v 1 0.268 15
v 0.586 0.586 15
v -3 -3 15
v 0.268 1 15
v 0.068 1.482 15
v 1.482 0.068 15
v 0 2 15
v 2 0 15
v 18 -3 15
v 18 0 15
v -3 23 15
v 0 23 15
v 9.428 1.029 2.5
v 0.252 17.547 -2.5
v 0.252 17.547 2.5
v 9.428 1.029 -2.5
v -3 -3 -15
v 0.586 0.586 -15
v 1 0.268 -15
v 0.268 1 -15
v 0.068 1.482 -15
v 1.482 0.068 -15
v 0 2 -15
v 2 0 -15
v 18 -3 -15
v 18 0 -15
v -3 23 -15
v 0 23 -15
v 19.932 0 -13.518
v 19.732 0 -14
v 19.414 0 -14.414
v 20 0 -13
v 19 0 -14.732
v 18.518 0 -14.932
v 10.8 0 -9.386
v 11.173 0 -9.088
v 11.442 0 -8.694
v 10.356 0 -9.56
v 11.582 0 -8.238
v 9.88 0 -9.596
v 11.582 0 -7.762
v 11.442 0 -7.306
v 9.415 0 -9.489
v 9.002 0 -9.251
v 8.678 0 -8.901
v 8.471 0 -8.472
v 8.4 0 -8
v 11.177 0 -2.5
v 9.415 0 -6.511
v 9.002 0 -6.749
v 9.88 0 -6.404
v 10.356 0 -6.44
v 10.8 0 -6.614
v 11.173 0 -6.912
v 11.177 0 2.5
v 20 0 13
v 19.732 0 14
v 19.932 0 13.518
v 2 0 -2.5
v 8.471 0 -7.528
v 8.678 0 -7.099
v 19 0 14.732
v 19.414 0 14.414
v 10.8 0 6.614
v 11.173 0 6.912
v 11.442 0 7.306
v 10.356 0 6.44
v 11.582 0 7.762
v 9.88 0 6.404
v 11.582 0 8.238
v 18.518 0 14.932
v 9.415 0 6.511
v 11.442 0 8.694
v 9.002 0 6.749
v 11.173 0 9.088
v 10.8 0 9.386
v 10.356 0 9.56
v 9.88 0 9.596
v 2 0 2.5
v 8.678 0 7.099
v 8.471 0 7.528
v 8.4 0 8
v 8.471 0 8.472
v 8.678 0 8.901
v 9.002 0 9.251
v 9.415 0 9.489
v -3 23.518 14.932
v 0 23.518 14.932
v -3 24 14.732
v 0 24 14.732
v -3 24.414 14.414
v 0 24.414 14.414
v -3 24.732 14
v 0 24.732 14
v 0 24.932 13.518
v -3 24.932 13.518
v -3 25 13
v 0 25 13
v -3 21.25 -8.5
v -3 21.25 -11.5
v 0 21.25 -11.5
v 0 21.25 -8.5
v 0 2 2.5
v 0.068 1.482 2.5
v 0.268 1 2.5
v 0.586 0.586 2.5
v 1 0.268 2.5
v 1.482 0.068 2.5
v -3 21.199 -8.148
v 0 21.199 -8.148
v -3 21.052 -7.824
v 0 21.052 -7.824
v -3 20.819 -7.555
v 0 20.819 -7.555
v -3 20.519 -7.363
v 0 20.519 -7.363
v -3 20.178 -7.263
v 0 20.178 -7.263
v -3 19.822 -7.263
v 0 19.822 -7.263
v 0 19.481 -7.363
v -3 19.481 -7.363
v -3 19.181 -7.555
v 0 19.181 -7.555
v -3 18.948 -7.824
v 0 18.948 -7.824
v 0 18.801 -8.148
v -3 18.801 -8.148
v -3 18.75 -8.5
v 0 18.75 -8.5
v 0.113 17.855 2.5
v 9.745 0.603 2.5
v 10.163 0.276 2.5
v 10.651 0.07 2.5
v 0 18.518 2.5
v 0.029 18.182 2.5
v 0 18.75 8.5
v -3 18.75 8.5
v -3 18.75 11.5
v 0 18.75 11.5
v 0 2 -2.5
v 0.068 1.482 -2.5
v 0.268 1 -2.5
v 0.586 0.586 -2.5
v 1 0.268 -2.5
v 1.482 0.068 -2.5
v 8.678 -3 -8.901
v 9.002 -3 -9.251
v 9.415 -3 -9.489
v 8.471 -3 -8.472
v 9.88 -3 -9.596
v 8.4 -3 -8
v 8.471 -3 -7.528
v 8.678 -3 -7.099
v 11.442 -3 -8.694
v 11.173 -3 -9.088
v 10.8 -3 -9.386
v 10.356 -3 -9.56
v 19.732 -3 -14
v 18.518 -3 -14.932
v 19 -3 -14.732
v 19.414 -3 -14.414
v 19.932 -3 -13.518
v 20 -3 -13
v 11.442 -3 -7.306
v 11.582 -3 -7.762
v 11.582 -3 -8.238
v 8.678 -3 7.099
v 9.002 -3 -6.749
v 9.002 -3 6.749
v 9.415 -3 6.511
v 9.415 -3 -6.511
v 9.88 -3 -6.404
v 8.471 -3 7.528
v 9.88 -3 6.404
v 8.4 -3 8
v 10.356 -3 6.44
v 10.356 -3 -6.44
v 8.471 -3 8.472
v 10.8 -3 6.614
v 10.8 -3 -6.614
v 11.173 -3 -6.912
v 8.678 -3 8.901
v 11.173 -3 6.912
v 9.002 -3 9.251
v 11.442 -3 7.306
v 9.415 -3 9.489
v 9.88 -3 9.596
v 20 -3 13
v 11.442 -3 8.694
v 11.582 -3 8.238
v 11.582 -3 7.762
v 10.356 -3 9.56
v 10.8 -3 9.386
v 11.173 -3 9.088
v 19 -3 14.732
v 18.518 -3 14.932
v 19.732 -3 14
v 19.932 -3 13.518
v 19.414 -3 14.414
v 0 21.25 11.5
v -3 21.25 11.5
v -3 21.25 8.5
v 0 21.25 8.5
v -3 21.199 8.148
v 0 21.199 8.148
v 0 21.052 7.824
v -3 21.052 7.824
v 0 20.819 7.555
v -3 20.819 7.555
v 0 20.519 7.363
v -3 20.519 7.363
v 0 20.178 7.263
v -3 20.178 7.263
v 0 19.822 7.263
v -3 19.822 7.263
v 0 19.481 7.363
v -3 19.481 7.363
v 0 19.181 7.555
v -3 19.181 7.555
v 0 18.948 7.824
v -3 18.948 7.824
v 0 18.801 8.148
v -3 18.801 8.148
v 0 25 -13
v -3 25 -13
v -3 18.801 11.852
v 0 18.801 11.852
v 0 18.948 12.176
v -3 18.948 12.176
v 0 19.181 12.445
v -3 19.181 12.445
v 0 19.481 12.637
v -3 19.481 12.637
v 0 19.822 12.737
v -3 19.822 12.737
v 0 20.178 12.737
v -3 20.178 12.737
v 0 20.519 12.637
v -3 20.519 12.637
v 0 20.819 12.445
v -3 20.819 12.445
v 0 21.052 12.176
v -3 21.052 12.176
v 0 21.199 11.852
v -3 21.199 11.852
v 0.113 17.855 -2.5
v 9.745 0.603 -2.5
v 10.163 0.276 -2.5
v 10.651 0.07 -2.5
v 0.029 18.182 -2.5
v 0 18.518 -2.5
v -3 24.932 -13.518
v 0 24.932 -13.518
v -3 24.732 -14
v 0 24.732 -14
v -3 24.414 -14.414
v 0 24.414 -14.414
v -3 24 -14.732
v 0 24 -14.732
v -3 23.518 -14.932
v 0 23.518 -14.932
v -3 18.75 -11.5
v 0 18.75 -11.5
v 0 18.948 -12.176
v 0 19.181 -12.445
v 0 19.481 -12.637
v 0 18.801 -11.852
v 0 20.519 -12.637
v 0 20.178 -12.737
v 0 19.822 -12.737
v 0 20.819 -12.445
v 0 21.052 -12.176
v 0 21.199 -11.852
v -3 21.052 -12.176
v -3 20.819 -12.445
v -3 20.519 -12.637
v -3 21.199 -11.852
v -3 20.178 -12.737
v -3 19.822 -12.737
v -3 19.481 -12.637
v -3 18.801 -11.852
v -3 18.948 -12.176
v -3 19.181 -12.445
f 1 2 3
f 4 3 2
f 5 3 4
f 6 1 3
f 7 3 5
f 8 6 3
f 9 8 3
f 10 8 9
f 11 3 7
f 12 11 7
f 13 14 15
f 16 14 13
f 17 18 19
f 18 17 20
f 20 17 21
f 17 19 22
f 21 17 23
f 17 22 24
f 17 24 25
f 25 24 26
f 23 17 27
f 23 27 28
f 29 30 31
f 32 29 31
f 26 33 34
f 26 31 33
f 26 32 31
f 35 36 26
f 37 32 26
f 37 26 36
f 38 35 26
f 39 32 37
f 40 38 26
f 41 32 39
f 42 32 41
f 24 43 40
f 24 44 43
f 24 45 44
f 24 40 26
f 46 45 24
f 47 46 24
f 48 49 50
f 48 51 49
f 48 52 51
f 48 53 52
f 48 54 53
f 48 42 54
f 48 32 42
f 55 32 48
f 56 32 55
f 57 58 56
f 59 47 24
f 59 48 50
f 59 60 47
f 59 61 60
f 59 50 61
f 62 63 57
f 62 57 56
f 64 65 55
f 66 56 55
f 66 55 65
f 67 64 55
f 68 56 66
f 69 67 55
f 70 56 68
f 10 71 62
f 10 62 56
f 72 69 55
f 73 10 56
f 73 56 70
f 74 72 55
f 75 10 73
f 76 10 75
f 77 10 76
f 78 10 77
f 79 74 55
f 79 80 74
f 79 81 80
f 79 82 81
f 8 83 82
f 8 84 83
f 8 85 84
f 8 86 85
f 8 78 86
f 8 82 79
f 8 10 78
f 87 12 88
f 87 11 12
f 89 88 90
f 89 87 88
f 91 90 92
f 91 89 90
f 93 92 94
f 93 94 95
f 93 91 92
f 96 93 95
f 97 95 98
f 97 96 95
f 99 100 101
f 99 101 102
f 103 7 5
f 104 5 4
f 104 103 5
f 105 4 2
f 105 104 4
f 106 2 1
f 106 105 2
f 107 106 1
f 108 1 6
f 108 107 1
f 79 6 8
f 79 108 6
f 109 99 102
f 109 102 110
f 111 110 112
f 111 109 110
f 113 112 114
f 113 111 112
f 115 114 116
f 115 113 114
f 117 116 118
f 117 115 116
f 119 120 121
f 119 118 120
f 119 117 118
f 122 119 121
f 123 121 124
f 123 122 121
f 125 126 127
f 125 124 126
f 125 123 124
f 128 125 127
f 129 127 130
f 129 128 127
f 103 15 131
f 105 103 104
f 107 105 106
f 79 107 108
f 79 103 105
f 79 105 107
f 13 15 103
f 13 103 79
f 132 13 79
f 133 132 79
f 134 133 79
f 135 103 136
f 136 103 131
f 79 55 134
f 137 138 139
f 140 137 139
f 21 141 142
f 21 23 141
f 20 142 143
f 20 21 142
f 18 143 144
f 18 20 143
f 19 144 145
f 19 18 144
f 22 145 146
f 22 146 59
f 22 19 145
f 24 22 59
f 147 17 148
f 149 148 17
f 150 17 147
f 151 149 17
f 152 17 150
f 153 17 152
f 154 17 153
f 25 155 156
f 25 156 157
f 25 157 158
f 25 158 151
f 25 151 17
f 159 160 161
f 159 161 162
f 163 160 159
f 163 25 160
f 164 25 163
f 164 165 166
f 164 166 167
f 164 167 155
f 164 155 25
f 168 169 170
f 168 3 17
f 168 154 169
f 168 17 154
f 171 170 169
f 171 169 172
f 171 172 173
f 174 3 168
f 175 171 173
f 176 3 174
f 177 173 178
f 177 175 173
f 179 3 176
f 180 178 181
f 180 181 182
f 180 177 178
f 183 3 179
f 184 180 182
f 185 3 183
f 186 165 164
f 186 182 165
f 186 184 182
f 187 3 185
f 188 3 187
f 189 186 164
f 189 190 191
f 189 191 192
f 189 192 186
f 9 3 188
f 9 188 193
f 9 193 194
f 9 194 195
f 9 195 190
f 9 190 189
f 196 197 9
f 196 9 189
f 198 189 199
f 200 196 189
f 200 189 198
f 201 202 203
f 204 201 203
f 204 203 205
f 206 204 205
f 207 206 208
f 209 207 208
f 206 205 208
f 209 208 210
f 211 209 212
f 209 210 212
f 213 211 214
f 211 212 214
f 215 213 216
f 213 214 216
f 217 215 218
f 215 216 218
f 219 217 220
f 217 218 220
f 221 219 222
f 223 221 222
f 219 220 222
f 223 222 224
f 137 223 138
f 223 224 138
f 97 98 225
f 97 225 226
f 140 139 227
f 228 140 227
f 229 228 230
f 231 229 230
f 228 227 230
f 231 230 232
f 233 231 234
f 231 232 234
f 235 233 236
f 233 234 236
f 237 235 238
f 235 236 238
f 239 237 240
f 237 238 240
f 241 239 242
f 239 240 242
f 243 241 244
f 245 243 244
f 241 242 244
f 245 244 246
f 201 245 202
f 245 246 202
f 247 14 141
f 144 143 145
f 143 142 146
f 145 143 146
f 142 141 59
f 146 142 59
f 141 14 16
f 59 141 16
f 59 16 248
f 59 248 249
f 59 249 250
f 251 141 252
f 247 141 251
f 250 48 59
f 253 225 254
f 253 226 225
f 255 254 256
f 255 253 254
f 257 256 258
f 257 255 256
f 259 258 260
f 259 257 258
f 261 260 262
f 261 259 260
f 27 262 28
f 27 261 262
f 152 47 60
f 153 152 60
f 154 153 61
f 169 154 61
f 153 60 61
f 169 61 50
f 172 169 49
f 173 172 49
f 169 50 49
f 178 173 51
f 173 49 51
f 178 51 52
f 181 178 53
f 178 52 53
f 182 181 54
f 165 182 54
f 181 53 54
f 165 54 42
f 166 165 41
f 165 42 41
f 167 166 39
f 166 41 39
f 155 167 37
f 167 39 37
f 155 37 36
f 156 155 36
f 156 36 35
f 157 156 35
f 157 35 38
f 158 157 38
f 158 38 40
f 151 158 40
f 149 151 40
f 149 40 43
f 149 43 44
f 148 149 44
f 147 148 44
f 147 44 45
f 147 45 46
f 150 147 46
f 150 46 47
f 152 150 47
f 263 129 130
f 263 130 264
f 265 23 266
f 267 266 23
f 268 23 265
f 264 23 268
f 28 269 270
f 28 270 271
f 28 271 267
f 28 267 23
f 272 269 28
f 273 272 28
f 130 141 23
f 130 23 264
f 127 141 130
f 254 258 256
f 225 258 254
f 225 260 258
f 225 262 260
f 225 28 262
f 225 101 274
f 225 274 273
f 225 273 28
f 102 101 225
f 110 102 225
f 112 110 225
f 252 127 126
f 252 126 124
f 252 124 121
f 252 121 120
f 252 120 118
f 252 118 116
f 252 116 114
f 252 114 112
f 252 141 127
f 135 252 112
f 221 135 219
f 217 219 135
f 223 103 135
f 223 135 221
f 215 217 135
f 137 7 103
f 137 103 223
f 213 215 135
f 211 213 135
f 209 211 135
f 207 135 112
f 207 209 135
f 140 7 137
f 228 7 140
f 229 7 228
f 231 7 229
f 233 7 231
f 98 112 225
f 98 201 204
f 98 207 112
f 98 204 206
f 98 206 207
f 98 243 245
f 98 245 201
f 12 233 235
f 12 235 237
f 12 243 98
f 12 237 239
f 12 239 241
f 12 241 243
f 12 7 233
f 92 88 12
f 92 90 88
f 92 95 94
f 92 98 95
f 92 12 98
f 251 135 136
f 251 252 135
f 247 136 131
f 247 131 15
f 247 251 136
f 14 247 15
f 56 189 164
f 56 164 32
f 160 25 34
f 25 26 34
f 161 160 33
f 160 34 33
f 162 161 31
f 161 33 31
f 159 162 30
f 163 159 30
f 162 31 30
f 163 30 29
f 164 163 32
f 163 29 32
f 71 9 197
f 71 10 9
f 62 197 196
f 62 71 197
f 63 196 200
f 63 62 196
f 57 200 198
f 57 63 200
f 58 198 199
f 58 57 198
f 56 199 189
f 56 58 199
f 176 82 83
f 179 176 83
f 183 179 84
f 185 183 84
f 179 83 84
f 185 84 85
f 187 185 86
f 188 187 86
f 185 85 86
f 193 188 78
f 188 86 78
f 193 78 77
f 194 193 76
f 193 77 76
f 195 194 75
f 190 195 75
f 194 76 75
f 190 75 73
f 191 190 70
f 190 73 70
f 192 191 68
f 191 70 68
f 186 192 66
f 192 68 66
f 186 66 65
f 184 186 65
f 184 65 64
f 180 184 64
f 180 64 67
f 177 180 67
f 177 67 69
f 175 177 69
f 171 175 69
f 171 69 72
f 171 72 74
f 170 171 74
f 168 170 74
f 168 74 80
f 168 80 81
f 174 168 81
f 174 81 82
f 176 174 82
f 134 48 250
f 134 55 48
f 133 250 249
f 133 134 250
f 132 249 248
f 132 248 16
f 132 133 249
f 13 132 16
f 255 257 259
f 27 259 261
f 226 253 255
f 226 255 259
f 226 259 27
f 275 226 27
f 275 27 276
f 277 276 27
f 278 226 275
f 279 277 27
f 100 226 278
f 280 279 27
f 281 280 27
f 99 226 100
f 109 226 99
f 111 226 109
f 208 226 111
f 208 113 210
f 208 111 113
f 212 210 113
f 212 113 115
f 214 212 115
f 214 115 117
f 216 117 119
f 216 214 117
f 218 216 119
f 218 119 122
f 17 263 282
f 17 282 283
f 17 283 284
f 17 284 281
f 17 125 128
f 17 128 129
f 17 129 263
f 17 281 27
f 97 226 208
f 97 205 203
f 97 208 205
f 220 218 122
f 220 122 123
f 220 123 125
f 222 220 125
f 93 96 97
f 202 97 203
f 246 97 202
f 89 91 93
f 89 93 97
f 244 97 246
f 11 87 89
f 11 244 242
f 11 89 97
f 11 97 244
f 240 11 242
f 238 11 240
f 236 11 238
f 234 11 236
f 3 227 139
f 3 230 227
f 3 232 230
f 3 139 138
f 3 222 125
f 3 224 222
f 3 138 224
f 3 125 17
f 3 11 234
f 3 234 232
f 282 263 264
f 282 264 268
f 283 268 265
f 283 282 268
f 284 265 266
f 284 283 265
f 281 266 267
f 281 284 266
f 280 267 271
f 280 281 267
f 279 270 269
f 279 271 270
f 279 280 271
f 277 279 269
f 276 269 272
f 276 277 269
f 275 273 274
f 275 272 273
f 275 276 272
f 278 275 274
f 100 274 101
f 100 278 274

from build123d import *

# Parameters (mm, degrees)
EXTRUDE_1_DEPTH     = 15
SKETCH_2_R          = 1.6
CUT_EXTRUDE_1_DEPTH = 25
CUT_EXTRUDE_2_DEPTH = 25
RIB_1_REACH         = 37.355
SKETCH_4_WALL_W     = 93.3019384
SKETCH_4_WALL_H     = 5
FILLET_1_R          = 2


with BuildPart() as part:
    # 草图1 → 凸台-拉伸1 (new, symmetric)
    with BuildSketch(Plane.XY):
        Polygon((0, 0), (0, 25), (-3, 25), (-3, -3), (20, -3), (20, 0), align=None)
    extrude(amount=EXTRUDE_1_DEPTH, both=True)

    # 草图2 → 切除-拉伸1 (cut)
    with BuildSketch(Plane(origin=(0, 0, 0), x_dir=(1, 0, 0), z_dir=(0, 1, 0))):
        with Locations(Location((10, -8, 0), (0, 0, 180))):
            Circle(SKETCH_2_R)
        with Locations(Location((10, 8, 0), (0, 0, 180))):
            Circle(SKETCH_2_R)
    extrude(amount=-CUT_EXTRUDE_1_DEPTH, mode=Mode.SUBTRACT)

    # 草图3 → 切除-拉伸2 (cut)
    with BuildSketch(Plane.ZY.offset(3)):
        with BuildLine():
            Line((-11.5, 21.25), (-8.5, 21.25))
            ThreePointArc((-8.5, 21.25), (-7.25, 20), (-8.5, 18.75))
            Line((-8.5, 18.75), (-11.5, 18.75))
            ThreePointArc((-11.5, 18.75), (-12.75, 20), (-11.5, 21.25))
        make_face()
        with BuildLine():
            Line((11.5, 21.25), (8.5, 21.25))
            ThreePointArc((8.5, 21.25), (7.25, 20), (8.5, 18.75))
            Line((8.5, 18.75), (11.5, 18.75))
            ThreePointArc((11.5, 18.75), (12.75, 20), (11.5, 21.25))
        make_face()
    extrude(amount=-CUT_EXTRUDE_2_DEPTH, mode=Mode.SUBTRACT)

    # 草图4 wall → 筋1 (add, up to next)
    with BuildSketch(Plane(origin=(5, 9, 0), x_dir=(0.485642931179, -0.874157276122, 0), z_dir=(0.874157276122, 0.485642931179, 0)), mode=Mode.PRIVATE) as rib_1_sk1:
        Rectangle(SKETCH_4_WALL_W, SKETCH_4_WALL_H)
    rib_1_tool1 = extrude(rib_1_sk1.sketch, amount=-RIB_1_REACH, mode=Mode.PRIVATE) - part.part
    add(rib_1_tool1.solids().sort_by_distance((5, 9, 0))[0])

    # 圆角1
    fillet_1_edges = [part.edges().sort_by_distance(p)[0] for p in [
        (0, 0, 8.75),
        (-1.5, 25, 15),
        (20, -1.5, 15),
        (20, -1.5, -15),
        (0, 0, -8.75),
        (10, 0, 0),
        (-1.5, 25, -15),
        (0, 18, 0),
    ]]
    fillet(fillet_1_edges, radius=FILLET_1_R)


solid = part.part
